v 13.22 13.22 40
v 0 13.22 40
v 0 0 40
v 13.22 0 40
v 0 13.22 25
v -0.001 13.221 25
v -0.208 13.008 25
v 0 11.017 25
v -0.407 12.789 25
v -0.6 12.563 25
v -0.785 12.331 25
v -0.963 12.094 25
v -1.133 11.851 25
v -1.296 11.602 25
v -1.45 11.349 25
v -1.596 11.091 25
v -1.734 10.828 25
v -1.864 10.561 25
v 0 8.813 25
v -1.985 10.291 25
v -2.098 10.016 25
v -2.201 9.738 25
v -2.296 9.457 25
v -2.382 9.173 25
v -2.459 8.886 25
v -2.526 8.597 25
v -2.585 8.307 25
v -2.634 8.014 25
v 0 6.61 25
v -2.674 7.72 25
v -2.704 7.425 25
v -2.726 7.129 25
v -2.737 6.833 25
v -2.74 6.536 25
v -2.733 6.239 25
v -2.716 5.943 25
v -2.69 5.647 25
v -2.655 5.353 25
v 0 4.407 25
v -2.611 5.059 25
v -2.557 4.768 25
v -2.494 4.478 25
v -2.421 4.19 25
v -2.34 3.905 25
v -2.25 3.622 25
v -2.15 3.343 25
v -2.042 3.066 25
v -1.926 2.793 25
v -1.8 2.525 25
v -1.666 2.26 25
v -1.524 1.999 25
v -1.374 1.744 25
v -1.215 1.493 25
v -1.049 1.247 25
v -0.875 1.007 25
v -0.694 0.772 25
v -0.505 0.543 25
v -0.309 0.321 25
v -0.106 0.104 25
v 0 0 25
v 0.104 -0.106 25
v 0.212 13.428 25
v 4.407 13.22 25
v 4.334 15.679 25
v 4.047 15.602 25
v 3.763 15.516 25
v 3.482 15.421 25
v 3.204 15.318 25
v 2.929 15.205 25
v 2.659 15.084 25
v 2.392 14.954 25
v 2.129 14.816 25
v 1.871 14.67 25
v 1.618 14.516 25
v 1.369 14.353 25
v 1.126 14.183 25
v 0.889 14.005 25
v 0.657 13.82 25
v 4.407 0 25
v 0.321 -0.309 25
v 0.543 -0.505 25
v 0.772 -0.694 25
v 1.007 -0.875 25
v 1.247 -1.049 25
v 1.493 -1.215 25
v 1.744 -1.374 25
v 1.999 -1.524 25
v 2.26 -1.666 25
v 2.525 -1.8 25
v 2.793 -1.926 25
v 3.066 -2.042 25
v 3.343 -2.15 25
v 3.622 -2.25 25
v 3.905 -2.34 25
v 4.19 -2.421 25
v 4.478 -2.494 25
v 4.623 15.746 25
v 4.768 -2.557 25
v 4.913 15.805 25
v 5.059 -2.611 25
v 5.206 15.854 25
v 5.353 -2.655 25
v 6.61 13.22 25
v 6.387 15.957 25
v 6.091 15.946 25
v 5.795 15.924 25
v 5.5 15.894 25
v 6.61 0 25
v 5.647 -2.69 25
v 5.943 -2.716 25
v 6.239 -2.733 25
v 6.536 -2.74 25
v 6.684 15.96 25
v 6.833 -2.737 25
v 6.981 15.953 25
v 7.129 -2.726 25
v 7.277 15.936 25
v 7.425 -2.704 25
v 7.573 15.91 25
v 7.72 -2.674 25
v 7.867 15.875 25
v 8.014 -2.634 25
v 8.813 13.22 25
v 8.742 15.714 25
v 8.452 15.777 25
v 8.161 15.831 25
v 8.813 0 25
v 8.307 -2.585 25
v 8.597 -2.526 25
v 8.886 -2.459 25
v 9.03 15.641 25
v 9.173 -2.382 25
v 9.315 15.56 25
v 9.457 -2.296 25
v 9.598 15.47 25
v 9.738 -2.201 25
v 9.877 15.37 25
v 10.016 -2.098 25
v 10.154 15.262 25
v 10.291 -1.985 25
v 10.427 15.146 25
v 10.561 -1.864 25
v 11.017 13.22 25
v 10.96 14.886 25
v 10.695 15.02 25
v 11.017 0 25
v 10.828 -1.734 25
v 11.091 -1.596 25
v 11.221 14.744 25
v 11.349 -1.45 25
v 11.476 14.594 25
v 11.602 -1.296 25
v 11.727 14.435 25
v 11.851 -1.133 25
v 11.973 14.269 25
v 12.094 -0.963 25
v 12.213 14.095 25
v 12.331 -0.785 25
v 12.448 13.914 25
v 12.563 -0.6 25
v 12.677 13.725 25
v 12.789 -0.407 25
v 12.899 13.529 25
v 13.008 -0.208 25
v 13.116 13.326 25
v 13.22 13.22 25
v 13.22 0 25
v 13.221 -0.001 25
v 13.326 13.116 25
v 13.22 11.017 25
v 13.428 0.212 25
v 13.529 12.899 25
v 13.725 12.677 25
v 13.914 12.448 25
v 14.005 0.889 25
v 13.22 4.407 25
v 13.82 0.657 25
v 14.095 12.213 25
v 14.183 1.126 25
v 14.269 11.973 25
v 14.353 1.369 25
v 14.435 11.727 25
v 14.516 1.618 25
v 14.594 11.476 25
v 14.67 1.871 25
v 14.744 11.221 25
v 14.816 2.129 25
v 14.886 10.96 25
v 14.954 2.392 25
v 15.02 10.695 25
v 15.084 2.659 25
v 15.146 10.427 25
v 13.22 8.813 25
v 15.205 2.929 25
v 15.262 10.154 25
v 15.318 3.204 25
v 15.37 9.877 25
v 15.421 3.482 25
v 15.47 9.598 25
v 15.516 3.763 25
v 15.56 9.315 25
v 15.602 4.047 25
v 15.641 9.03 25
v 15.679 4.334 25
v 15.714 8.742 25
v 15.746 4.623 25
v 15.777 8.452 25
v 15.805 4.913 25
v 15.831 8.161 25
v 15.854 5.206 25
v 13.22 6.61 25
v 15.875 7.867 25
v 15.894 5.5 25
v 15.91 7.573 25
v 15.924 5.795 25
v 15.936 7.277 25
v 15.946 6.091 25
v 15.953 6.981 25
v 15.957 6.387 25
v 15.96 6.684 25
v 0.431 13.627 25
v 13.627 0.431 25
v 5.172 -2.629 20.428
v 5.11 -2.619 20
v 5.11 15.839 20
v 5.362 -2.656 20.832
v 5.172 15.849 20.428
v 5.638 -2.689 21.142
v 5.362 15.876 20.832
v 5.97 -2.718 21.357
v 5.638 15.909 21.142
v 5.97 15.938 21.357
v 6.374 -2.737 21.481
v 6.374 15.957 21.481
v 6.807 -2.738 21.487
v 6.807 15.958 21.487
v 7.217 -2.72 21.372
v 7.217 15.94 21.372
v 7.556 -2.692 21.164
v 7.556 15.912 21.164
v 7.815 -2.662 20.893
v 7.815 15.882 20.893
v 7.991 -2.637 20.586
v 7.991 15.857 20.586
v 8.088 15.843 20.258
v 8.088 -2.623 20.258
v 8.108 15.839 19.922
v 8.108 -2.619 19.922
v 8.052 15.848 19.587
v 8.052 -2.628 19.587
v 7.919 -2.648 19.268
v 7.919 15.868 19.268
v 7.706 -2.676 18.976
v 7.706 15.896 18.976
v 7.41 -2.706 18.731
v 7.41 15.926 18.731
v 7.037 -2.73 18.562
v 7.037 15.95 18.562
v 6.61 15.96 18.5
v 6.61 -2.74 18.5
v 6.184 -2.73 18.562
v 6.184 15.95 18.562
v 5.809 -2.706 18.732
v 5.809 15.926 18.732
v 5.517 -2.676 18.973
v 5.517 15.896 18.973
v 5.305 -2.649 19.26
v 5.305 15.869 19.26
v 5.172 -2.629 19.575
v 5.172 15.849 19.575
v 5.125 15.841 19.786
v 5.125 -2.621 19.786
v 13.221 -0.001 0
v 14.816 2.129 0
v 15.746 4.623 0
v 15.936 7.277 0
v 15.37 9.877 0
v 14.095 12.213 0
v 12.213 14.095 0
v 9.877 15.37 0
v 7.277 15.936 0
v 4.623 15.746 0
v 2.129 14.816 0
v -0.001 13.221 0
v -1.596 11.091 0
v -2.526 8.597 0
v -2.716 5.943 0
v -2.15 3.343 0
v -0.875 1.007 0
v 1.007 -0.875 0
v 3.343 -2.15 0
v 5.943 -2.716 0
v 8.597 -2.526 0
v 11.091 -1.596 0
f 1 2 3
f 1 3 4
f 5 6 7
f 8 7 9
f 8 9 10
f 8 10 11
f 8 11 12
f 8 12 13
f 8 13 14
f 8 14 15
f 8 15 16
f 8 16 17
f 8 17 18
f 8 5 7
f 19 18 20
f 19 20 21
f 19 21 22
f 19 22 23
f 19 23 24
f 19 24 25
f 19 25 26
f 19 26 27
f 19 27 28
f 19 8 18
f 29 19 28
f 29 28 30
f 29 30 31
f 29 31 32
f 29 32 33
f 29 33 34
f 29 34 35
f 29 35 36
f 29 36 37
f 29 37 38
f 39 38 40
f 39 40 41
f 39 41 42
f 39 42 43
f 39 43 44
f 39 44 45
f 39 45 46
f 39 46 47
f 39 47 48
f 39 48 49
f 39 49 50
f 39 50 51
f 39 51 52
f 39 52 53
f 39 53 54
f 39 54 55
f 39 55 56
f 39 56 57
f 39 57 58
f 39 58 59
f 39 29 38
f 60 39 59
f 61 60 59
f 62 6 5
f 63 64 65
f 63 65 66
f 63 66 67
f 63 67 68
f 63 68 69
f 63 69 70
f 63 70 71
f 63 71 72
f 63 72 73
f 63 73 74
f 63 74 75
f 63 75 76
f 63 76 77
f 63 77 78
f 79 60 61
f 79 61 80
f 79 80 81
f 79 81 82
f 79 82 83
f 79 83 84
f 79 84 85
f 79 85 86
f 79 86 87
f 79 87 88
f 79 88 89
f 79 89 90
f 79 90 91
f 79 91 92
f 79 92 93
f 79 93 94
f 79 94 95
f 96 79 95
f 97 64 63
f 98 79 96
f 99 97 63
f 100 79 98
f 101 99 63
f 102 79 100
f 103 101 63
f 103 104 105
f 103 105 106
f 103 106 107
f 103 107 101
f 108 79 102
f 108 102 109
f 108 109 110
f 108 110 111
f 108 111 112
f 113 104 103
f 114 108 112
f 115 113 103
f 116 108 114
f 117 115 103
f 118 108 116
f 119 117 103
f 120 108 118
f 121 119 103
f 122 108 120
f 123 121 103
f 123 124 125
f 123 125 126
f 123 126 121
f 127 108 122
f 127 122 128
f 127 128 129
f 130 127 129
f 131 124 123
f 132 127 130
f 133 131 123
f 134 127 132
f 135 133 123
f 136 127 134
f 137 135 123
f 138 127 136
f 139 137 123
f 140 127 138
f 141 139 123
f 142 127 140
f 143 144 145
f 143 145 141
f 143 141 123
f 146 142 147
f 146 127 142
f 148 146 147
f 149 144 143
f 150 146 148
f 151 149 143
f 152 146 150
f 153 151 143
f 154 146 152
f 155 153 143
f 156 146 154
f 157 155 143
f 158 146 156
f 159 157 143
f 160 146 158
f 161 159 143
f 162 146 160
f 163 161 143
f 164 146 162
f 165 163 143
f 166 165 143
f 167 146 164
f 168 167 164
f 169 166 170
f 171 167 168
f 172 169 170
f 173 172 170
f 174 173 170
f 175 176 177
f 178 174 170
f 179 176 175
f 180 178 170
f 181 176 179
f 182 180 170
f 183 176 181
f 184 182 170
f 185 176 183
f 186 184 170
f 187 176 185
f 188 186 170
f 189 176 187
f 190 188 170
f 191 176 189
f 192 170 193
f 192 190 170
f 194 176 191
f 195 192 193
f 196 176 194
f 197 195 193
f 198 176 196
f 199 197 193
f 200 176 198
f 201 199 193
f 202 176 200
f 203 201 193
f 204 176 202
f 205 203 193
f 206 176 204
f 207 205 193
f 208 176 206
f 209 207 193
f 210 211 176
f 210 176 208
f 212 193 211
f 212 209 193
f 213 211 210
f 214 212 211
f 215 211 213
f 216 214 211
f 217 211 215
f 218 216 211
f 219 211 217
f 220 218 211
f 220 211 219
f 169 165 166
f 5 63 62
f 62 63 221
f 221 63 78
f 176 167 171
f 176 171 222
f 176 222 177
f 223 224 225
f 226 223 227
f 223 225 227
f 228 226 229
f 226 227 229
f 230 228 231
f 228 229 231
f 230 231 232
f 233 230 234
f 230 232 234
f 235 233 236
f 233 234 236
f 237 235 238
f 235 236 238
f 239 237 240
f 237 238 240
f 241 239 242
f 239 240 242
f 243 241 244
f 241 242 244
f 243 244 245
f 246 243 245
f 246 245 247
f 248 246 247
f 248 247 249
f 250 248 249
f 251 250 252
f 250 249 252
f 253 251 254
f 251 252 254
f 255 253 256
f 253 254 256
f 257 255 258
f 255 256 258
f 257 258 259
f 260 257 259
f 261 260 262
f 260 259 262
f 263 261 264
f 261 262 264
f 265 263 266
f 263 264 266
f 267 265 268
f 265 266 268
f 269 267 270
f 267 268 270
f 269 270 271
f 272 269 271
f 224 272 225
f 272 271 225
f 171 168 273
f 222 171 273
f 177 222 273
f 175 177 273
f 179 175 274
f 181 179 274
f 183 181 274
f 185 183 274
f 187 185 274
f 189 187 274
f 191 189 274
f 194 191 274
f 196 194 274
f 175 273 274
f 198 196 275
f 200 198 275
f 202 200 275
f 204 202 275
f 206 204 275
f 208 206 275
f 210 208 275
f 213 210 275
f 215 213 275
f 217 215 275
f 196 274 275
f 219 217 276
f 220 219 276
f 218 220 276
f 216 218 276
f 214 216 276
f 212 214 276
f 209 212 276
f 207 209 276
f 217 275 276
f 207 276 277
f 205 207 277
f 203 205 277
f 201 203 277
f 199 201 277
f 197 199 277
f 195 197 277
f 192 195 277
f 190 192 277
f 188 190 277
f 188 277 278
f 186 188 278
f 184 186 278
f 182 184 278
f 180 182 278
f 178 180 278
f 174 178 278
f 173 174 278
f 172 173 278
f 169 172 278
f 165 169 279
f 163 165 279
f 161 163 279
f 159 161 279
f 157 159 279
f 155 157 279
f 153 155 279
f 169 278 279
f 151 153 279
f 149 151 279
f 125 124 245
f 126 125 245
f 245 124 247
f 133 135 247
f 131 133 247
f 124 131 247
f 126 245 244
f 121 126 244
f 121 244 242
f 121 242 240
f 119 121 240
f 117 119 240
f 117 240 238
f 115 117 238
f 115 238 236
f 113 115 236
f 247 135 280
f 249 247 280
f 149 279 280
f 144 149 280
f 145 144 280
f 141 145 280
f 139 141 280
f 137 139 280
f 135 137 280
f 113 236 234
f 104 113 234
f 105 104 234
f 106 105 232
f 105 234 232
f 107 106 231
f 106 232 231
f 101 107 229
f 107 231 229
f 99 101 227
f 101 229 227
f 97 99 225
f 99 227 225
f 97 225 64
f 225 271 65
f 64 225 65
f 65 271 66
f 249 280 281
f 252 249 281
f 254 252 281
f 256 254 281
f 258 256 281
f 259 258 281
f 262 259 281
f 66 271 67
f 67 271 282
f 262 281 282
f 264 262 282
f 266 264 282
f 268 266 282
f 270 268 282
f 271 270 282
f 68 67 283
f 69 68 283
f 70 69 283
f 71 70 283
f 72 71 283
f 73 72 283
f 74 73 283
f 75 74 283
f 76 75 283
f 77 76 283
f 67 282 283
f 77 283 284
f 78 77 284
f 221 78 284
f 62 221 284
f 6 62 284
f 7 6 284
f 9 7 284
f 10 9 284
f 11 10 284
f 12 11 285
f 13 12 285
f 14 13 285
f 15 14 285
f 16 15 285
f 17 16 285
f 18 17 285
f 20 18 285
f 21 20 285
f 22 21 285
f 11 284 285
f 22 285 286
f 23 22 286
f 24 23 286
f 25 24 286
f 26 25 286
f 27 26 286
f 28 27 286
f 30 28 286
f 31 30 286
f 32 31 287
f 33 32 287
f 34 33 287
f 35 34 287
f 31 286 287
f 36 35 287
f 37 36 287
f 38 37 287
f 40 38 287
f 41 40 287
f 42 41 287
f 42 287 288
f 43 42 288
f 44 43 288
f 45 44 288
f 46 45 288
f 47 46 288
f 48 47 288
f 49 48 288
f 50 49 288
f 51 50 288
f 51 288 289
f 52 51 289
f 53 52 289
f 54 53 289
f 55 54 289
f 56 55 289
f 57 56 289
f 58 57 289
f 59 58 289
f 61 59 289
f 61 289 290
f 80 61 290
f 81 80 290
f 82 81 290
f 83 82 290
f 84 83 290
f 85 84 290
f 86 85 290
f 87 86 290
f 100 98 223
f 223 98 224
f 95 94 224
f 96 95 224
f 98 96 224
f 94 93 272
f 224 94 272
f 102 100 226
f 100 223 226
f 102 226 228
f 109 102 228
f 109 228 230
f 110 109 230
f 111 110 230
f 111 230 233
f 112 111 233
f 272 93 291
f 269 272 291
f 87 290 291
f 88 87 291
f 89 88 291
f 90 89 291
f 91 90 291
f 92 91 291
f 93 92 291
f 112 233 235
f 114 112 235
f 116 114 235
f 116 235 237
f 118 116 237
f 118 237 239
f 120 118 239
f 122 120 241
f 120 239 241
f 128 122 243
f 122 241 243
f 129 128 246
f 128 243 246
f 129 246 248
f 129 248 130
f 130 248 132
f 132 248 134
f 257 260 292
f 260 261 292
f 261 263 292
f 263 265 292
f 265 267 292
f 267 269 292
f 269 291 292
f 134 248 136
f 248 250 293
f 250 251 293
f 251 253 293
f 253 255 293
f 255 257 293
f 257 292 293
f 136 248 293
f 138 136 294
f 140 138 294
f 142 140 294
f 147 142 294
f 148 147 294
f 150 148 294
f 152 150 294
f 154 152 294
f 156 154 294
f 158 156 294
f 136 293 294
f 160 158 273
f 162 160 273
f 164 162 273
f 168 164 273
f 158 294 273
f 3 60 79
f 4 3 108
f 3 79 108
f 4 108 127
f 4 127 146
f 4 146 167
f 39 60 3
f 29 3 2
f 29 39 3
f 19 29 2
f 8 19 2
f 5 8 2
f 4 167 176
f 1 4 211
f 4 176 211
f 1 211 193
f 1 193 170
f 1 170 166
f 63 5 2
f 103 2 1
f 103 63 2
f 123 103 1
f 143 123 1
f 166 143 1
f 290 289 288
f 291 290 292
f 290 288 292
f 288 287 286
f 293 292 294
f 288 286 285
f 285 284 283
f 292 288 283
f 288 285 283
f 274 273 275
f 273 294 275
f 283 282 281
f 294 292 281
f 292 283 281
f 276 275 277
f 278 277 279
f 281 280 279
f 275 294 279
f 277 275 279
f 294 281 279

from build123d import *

# Parameters (mm, degrees)
BOX_W                    = 13.22
BOX_H                    = 13.22
BOX_DEPTH                = 40
CYLINDER_R               = 9.35
CYLINDER_DEPTH           = 25
CYLINDER_PLACEMENT_ANGLE = 315
SKETCH_R                 = 1.5
POCKET_DEPTH             = 2.741
POCKET_DEPTH_BACK        = 15.961


with BuildPart() as cube:
    # Box → Box (new body)
    with BuildSketch(Plane.XY):
        with Locations((6.61, 6.61)):
            Rectangle(BOX_W, BOX_H)
    extrude(amount=BOX_DEPTH)


with BuildPart() as body:
    # Cylinder → Cylinder (new body)
    with BuildSketch(Plane.XY):
        Circle(CYLINDER_R)
    extrude(amount=CYLINDER_DEPTH)


with BuildPart() as body_1:
    # Cylinder placement: moved
    add(body.part.moved(Location((6.61, 6.61, 0))).rotate(Axis((6.61, 6.61, 0), (0, 0, 1)), CYLINDER_PLACEMENT_ANGLE))

    # Fusion: union Cube
    add(cube.part)

    # Sketch (on Face6 of Fusion) → Pocket (cut, two sides)
    with BuildSketch(Plane(origin=(0, 13.22, 0), x_dir=(-1, 0, 0), z_dir=(0, 1, 0))) as pocket_sk:
        with Locations((-6.61, 20)):
            Circle(SKETCH_R)
    extrude(amount=POCKET_DEPTH, mode=Mode.SUBTRACT)
    extrude(pocket_sk.sketch, amount=-POCKET_DEPTH_BACK, mode=Mode.SUBTRACT)


solid = body_1.part
